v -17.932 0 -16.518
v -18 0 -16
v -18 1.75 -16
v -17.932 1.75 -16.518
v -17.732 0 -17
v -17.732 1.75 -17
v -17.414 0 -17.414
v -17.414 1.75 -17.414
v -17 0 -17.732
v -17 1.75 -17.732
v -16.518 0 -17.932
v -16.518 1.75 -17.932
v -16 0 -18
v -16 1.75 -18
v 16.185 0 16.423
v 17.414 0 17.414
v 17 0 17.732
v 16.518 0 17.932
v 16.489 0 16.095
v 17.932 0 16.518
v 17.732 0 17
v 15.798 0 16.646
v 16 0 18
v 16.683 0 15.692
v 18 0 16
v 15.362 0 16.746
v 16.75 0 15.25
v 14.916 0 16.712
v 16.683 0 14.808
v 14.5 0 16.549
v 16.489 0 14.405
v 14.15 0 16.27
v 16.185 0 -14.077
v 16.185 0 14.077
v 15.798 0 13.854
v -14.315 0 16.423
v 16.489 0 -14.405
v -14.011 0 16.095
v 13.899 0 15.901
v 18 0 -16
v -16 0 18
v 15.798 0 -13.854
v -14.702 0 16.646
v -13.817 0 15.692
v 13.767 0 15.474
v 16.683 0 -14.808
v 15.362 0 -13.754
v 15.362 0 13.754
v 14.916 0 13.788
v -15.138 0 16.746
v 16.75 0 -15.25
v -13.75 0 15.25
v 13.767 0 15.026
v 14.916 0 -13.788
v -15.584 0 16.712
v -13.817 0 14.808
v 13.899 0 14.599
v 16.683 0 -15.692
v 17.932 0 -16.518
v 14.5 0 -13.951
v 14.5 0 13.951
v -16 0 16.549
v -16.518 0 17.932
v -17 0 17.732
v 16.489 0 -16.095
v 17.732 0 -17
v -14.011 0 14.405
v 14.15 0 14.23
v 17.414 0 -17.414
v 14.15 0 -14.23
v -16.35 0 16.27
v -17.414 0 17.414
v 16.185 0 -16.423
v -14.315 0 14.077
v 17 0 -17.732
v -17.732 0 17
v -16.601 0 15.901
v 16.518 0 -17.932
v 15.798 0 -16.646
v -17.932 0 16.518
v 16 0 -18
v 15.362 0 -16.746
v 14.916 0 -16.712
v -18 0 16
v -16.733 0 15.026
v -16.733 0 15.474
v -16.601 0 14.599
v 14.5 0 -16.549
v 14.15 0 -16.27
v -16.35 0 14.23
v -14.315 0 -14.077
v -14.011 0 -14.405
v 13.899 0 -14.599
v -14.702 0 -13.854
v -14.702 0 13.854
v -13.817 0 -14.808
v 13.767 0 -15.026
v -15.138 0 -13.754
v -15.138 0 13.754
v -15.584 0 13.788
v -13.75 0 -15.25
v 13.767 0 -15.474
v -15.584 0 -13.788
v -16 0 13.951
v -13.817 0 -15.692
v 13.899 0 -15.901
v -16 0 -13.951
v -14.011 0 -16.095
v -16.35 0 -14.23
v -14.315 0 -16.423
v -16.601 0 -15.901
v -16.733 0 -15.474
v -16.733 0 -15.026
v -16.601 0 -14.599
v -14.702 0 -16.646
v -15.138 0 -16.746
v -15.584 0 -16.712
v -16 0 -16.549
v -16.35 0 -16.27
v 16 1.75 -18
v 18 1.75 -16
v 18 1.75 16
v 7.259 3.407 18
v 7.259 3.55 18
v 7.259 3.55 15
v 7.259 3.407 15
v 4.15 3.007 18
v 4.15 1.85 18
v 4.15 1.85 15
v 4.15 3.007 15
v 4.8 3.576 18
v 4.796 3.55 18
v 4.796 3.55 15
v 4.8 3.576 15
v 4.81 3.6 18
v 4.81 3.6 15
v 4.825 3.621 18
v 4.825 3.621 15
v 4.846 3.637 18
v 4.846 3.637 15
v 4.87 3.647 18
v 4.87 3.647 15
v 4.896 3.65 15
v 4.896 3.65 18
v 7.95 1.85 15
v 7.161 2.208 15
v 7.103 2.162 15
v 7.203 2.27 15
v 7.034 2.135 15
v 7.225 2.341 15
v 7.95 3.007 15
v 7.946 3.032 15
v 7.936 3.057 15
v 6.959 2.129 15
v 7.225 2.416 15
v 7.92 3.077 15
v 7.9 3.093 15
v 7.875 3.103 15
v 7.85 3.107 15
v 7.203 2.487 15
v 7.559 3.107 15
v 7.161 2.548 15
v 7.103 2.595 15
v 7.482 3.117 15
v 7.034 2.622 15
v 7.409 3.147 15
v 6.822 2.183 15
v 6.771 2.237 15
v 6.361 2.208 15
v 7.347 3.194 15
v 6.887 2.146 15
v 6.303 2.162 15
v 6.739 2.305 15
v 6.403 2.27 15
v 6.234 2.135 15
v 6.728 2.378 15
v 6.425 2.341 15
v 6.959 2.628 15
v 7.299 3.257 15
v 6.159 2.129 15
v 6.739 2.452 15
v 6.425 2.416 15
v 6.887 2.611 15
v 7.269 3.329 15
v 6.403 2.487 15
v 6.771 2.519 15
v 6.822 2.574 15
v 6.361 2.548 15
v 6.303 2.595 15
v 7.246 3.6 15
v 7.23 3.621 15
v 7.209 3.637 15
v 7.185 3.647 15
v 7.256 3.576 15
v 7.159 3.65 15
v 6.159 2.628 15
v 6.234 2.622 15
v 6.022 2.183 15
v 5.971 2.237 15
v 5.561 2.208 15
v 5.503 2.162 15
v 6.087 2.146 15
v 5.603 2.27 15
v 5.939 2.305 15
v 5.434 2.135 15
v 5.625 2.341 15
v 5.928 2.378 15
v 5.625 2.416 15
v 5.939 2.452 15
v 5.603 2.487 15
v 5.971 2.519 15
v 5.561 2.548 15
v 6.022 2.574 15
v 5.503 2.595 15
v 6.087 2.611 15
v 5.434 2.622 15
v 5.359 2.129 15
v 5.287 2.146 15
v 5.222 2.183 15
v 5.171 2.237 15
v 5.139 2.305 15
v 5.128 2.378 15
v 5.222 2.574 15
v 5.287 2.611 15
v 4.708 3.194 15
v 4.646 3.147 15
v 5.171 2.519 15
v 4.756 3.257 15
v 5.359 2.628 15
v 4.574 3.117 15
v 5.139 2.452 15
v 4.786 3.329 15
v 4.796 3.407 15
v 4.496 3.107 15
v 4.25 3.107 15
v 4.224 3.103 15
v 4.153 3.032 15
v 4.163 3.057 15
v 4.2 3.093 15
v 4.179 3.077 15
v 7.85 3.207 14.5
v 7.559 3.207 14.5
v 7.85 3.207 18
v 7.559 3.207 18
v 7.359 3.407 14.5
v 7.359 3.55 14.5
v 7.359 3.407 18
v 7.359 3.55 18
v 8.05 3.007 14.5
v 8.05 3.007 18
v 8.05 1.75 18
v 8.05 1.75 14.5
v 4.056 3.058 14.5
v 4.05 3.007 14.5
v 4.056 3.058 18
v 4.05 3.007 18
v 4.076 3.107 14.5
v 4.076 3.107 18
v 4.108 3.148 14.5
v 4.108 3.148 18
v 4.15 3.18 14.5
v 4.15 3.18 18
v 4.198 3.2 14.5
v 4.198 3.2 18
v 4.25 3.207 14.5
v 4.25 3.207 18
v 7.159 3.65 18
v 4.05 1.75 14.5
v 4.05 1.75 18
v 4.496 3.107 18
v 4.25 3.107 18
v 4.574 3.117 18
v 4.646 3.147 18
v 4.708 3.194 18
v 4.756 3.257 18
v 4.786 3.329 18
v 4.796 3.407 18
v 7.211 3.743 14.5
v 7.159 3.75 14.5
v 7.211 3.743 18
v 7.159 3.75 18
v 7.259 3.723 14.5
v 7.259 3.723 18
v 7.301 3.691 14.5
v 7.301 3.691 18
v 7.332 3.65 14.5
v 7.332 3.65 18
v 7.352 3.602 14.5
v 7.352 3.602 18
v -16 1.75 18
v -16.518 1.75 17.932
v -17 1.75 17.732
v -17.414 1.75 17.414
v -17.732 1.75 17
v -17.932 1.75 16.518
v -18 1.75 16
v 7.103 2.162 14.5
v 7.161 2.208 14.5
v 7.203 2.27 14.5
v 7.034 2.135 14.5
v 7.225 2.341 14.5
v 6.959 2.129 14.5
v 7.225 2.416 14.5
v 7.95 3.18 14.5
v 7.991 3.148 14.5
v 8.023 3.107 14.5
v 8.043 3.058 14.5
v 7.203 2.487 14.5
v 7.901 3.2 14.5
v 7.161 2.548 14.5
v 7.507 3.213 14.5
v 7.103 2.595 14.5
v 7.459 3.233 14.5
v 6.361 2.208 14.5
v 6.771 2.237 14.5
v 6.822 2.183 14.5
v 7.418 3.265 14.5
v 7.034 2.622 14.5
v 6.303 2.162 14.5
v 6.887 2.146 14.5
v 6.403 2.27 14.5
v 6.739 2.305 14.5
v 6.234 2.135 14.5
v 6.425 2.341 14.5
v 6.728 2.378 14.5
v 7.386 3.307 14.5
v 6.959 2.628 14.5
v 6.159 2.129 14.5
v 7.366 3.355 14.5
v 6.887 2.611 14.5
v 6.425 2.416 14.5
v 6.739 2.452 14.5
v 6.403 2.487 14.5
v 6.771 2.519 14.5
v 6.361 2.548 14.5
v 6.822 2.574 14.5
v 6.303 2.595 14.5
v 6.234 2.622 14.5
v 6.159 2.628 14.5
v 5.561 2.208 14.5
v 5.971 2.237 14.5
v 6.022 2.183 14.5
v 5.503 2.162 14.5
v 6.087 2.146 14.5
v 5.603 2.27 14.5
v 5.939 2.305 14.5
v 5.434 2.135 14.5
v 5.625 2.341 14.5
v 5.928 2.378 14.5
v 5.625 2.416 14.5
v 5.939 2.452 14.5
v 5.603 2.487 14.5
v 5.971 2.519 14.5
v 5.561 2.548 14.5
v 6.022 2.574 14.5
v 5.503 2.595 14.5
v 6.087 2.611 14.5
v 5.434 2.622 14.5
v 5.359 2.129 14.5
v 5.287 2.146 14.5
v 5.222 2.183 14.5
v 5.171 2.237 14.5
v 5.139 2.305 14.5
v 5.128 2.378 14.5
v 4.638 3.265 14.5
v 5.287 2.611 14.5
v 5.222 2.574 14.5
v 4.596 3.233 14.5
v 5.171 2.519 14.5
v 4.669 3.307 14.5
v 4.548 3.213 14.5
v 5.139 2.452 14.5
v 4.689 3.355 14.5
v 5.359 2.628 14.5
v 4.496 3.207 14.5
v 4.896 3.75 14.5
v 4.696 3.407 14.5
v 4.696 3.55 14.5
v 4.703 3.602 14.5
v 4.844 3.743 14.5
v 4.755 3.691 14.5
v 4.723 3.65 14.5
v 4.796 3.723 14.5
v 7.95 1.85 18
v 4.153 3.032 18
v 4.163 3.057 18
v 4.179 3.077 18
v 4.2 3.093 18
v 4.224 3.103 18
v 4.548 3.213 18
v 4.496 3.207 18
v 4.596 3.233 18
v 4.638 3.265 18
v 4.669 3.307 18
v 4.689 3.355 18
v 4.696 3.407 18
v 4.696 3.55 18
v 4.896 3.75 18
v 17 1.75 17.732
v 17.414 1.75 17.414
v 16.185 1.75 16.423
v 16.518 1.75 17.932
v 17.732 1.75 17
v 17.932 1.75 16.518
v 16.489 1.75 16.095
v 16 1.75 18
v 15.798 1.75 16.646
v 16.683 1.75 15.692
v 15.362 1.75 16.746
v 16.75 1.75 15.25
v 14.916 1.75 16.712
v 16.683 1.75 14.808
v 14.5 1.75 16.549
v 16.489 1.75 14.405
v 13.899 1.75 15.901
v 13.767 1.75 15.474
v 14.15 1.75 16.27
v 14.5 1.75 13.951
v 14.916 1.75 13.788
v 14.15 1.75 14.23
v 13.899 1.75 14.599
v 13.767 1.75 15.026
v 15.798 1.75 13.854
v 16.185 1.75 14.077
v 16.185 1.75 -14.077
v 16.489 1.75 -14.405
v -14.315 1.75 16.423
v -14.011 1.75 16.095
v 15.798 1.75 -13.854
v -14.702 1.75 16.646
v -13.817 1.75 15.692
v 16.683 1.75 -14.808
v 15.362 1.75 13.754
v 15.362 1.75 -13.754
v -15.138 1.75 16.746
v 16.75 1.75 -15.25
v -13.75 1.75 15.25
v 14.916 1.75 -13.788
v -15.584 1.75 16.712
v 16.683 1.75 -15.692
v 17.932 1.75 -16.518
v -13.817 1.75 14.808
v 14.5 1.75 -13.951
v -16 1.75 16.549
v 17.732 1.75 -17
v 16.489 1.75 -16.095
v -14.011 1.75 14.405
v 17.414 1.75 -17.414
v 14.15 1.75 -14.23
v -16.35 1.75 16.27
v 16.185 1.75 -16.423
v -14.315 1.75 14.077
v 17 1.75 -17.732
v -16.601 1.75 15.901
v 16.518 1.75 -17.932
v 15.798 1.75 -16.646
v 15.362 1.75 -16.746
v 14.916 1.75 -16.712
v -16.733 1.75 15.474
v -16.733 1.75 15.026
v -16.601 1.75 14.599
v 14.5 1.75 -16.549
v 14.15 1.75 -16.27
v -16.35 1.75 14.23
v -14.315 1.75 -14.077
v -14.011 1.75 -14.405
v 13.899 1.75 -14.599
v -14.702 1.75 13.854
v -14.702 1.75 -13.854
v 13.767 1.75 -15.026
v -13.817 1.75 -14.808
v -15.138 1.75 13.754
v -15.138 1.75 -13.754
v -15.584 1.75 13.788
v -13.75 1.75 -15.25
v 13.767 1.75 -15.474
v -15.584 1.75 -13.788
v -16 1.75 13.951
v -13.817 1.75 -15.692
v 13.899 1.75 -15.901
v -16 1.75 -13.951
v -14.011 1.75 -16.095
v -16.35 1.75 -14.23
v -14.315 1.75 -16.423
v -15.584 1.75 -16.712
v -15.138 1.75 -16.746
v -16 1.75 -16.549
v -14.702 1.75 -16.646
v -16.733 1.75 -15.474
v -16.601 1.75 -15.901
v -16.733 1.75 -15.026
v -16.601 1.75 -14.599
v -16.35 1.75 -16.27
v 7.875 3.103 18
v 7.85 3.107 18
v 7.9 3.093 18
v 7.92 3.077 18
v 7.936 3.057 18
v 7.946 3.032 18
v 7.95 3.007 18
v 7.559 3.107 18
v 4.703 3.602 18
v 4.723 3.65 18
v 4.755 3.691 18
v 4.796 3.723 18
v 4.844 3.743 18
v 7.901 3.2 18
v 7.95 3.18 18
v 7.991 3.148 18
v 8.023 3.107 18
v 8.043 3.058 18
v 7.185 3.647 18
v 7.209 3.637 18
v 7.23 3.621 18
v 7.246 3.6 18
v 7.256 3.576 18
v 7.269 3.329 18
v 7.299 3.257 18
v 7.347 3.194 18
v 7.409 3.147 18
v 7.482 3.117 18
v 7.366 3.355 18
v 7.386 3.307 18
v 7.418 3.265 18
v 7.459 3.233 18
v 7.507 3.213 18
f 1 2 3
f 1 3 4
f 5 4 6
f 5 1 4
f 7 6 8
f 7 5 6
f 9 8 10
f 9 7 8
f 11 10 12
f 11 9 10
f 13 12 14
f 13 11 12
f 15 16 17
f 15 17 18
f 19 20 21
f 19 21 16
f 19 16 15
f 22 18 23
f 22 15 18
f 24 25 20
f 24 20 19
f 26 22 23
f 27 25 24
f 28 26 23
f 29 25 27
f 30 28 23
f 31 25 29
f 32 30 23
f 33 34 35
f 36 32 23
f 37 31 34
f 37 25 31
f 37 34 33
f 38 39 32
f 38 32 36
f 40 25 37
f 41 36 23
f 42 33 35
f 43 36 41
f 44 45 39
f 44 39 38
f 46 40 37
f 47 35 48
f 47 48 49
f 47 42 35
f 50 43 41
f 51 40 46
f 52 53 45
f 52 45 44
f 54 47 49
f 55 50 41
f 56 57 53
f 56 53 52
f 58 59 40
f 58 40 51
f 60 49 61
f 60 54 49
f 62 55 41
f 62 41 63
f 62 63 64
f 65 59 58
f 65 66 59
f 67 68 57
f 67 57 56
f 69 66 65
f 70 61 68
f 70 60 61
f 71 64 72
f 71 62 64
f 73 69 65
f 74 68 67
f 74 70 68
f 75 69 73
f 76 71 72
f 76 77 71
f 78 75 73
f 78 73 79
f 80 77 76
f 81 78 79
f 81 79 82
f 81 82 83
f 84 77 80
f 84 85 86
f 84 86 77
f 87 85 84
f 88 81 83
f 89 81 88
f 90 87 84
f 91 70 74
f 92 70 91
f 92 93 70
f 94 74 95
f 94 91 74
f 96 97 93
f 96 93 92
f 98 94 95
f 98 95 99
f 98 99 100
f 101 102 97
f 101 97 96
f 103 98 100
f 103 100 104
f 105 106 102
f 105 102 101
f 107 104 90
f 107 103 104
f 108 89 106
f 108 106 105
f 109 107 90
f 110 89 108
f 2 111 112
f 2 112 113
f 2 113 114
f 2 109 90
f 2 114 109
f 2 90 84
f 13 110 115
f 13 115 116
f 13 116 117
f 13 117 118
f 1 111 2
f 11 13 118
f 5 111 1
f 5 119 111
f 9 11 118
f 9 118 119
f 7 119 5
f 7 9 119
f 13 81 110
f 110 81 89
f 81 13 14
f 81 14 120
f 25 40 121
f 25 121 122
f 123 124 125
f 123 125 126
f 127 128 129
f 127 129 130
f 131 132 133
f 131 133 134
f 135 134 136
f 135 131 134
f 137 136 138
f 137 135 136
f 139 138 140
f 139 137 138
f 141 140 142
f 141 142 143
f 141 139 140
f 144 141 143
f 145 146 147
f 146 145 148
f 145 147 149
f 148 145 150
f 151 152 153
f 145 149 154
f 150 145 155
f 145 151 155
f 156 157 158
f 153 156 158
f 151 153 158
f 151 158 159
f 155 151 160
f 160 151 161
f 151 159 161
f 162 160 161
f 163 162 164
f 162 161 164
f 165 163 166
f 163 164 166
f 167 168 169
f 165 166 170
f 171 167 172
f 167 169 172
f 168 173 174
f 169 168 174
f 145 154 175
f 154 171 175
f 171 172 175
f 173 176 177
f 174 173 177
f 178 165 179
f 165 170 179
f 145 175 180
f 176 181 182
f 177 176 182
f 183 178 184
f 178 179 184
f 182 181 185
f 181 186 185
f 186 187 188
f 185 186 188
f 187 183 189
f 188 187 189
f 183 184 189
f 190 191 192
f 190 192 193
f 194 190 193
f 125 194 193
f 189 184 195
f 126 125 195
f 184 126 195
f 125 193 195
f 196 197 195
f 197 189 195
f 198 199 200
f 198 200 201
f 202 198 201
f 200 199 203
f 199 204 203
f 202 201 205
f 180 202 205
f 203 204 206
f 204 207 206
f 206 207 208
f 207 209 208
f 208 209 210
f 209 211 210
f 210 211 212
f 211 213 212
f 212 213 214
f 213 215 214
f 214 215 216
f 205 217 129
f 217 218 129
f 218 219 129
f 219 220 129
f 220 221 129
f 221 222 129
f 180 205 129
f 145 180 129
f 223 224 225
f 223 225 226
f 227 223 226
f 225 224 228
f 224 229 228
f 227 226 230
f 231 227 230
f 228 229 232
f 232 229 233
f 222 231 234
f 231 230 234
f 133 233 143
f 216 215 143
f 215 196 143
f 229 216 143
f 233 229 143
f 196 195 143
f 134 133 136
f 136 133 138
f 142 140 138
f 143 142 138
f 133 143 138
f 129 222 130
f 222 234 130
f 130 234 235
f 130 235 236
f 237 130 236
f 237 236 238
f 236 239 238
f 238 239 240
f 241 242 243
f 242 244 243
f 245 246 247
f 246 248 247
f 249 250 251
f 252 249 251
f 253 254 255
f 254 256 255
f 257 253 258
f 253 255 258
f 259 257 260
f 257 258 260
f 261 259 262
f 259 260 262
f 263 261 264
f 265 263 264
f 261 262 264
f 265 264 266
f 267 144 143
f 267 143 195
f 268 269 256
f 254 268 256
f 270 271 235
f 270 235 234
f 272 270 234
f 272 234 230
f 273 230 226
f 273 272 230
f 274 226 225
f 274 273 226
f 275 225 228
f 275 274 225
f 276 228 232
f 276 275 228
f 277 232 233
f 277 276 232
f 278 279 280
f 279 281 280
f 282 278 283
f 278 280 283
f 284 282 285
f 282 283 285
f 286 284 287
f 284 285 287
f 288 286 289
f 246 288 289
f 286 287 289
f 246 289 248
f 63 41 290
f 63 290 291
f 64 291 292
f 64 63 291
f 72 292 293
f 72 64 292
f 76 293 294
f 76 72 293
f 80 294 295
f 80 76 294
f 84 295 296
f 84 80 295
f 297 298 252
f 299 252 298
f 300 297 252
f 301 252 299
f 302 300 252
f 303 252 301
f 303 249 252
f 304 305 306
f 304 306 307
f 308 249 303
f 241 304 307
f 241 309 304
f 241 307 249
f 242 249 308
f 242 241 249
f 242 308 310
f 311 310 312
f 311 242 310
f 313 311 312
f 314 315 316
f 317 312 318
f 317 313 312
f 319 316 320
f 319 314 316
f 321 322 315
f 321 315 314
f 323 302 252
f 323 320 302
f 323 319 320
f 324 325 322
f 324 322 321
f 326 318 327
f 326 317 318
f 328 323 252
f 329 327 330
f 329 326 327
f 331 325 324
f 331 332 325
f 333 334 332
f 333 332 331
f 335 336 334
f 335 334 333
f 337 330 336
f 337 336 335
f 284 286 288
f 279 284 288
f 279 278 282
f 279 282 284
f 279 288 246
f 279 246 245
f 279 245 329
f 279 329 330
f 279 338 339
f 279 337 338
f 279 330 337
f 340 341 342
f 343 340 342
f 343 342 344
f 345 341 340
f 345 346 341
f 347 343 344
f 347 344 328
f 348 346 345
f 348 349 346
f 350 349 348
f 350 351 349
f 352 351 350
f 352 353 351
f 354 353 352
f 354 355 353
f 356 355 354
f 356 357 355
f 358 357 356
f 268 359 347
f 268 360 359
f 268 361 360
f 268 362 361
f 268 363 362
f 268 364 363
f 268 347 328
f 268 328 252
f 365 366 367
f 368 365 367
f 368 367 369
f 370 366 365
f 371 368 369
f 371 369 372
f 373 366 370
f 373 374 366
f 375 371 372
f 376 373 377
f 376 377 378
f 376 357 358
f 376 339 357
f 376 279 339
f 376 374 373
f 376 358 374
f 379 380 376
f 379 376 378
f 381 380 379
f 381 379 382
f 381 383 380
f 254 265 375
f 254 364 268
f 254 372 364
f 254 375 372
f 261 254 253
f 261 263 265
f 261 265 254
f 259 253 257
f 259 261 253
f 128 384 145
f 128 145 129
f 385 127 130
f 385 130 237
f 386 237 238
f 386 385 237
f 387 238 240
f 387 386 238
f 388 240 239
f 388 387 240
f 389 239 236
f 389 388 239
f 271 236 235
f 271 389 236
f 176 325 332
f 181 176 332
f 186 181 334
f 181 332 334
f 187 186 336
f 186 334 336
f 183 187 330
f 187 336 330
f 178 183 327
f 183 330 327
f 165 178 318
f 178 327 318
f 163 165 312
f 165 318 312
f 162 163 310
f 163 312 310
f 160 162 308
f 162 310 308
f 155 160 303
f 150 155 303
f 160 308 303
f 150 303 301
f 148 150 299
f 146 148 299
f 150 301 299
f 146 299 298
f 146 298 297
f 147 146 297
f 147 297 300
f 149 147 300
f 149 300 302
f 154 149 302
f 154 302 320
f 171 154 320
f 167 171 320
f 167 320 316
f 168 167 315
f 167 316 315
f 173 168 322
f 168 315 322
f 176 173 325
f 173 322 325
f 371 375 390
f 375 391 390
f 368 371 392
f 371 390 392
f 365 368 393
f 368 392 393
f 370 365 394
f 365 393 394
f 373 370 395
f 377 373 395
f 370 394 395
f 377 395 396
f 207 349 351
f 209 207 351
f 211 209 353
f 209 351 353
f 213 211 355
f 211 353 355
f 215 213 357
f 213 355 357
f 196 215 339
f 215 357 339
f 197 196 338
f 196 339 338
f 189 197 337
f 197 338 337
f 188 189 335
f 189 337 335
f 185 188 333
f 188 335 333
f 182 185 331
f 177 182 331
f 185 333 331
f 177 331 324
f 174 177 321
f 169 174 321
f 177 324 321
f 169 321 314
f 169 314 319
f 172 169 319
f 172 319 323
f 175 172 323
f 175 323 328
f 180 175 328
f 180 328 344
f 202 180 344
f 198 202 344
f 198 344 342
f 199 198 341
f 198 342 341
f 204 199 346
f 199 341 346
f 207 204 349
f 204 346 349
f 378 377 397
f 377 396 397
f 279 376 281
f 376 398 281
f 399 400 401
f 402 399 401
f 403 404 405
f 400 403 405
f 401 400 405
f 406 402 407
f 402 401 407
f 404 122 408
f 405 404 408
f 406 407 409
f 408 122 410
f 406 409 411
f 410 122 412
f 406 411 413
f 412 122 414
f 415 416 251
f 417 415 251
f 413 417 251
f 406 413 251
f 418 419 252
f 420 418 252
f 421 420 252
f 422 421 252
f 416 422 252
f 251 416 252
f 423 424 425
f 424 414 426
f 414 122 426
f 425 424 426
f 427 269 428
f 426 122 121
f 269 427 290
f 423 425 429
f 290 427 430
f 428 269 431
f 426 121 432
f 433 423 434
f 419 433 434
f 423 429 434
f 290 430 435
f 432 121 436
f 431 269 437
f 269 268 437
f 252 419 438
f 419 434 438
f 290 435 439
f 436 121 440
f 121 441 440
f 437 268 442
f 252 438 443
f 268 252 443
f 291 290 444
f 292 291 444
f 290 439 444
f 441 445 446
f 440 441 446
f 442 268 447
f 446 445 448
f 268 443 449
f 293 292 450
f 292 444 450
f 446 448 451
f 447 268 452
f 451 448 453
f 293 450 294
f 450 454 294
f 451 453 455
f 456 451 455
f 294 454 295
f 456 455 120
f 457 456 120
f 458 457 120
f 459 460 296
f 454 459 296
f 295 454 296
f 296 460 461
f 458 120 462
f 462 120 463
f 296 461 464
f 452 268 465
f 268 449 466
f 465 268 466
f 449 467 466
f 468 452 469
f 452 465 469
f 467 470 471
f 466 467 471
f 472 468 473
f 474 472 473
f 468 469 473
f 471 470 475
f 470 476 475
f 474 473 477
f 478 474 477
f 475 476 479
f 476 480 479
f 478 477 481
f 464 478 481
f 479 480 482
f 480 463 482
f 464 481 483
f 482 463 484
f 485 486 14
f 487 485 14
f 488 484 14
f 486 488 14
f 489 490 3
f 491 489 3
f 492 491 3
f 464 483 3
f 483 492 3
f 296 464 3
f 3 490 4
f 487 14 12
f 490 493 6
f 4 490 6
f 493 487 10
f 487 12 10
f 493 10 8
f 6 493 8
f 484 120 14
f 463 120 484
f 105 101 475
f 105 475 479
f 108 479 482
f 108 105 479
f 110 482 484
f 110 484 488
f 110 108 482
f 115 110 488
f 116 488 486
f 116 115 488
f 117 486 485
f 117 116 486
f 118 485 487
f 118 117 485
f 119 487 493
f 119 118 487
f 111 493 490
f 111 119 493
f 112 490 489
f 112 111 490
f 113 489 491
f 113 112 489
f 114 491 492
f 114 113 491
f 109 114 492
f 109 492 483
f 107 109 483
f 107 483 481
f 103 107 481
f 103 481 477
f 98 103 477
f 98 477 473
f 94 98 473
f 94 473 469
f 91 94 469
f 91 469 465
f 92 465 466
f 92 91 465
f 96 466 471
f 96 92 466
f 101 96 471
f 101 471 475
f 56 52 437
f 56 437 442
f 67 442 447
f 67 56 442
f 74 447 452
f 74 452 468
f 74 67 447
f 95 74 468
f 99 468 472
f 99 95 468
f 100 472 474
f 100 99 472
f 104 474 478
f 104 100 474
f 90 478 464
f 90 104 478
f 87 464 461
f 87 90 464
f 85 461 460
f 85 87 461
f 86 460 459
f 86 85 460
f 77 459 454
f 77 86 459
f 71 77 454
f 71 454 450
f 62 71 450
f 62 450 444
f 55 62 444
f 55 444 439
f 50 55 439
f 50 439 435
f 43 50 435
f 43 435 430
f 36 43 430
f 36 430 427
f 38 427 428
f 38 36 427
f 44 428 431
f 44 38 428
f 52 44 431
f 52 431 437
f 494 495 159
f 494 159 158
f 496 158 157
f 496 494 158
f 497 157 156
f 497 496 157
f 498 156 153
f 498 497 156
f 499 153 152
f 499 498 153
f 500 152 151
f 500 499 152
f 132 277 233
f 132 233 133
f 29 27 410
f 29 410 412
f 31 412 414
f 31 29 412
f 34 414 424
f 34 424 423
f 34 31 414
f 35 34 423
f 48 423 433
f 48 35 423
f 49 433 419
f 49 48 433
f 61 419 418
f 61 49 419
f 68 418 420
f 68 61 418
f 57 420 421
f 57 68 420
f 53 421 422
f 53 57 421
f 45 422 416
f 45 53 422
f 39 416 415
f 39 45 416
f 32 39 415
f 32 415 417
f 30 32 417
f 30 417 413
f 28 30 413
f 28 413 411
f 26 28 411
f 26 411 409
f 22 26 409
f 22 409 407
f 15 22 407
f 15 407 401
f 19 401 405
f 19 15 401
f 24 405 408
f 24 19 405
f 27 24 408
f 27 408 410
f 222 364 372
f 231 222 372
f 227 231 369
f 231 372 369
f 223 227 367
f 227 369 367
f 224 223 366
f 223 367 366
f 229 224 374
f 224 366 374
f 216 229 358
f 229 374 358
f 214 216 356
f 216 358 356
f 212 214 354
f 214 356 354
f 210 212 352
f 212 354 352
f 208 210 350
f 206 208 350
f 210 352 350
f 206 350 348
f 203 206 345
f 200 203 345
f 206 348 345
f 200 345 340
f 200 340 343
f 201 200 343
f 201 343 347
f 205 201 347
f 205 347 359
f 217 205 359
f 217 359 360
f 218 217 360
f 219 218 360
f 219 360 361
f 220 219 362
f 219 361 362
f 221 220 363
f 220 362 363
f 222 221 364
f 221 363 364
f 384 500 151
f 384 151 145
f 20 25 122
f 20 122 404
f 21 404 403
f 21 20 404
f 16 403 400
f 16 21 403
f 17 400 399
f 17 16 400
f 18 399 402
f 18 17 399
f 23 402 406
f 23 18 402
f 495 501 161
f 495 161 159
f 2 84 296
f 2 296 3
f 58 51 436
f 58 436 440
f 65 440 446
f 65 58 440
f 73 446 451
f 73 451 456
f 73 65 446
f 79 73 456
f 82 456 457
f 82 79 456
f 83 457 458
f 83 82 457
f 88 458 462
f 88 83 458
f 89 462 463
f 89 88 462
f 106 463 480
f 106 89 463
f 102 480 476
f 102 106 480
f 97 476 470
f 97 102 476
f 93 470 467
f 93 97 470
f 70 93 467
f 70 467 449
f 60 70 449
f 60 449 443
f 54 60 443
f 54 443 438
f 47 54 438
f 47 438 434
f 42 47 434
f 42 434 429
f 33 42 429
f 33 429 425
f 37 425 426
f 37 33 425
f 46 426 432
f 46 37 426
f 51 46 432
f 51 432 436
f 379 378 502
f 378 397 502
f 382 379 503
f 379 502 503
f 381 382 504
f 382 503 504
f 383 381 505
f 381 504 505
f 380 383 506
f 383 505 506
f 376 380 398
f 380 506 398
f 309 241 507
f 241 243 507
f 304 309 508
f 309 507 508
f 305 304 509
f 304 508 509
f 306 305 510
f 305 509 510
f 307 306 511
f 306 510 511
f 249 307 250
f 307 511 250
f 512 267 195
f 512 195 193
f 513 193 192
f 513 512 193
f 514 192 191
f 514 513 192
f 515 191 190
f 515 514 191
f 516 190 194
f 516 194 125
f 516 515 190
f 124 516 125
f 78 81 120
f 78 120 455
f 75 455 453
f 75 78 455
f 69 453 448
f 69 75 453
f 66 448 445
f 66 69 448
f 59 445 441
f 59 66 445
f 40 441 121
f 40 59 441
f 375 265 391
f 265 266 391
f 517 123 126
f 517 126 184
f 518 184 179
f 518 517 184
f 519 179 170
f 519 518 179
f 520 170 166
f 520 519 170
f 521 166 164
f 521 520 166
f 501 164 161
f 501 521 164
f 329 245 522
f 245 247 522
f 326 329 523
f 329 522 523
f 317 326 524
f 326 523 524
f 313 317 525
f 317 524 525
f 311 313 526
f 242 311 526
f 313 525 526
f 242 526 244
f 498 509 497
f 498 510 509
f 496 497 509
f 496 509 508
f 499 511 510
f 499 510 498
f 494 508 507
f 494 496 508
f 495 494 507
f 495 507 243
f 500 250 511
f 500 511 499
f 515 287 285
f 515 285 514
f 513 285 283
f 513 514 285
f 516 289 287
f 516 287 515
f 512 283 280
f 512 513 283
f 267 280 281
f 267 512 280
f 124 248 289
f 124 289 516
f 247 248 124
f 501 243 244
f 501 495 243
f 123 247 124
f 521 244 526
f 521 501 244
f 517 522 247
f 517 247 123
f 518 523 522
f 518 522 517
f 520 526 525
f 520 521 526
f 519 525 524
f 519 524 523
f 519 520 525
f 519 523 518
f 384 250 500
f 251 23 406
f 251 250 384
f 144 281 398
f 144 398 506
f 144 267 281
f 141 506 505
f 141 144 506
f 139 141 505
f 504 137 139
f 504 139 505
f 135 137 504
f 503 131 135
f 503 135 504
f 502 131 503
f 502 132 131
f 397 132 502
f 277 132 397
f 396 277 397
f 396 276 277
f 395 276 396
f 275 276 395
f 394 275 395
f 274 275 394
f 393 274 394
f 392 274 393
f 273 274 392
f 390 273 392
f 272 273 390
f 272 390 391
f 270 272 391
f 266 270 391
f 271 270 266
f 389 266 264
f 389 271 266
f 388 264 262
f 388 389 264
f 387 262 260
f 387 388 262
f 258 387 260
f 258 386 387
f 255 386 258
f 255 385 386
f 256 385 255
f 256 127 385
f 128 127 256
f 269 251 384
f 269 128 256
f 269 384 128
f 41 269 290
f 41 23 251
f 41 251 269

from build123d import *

# Parameters (mm, degrees)
SKETCH3_R           = 1.5
BOSS_EXTRUDE1_DEPTH = 1.75
BOSS_EXTRUDE2_DEPTH = 3
BOSS_EXTRUDE3_DEPTH = 0.5
SKETCH7_R           = 0.25
CUT_EXTRUDE1_DEPTH  = 0.5


with BuildPart() as part:
    # Sketch3 → Boss-Extrude1 (new body)
    with BuildSketch(Plane(origin=(0, 0, 0), x_dir=(1, 0, 0), z_dir=(0, 1, 0))):
        with BuildLine():
            Line((-16, 18), (16, 18))
            ThreePointArc((16, 18), (17.414213562, 17.414213562), (18, 16))
            Line((18, 16), (18, -16))
            ThreePointArc((18, -16), (17.414213562, -17.414213562), (16, -18))
            Line((16, -18), (-16, -18))
            ThreePointArc((-16, -18), (-17.414213562, -17.414213562), (-18, -16))
            Line((-18, -16), (-18, 16))
            ThreePointArc((-18, 16), (-17.414213562, 17.414213562), (-16, 18))
        make_face()
        with Locations((-15.25, 15.25)):
            Circle(SKETCH3_R, mode=Mode.SUBTRACT)
        with Locations((15.25, 15.25)):
            Circle(SKETCH3_R, mode=Mode.SUBTRACT)
        with Locations((15.25, -15.25)):
            Circle(SKETCH3_R, mode=Mode.SUBTRACT)
        with Locations((-15.25, -15.25)):
            Circle(SKETCH3_R, mode=Mode.SUBTRACT)
    extrude(amount=BOSS_EXTRUDE1_DEPTH)

    # Sketch5 → Boss-Extrude2 (add)
    with BuildSketch(Plane.XY.offset(18)):
        with BuildLine():
            Line((4.049502187, 1.75), (8.049502187, 1.75))
            Line((8.049502187, 1.75), (8.049502187, 3.006518046))
            ThreePointArc((8.049502187, 3.006518046), (7.990923543, 3.147939402), (7.849502187, 3.206518046))
            Line((7.849502187, 3.206518046), (7.559209809, 3.206518046))
            ThreePointArc((7.559209809, 3.206518046), (7.417788453, 3.26509669), (7.359209809, 3.406518046))
            Line((7.359209809, 3.406518046), (7.359209809, 3.55))
            ThreePointArc((7.359209809, 3.55), (7.300631165, 3.691421356), (7.159209809, 3.75))
            Line((7.159209809, 3.75), (4.896173717, 3.75))
            ThreePointArc((4.896173717, 3.75), (4.754752361, 3.691421356), (4.696173717, 3.55))
            Line((4.696173717, 3.55), (4.696173717, 3.406518046))
            ThreePointArc((4.696173717, 3.406518046), (4.637595073, 3.26509669), (4.496173717, 3.206518046))
            Line((4.496173717, 3.206518046), (4.249502187, 3.206518046))
            ThreePointArc((4.249502187, 3.206518046), (4.10808083, 3.147939402), (4.049502187, 3.006518046))
            Line((4.049502187, 3.006518046), (4.049502187, 1.75))
        make_face()
        with BuildLine():
            Line((4.896173717, 3.65), (7.159209809, 3.65))
            ThreePointArc((7.159209809, 3.65), (7.229920487, 3.620710678), (7.259209809, 3.55))
            Line((7.259209809, 3.55), (7.259209809, 3.406518046))
            ThreePointArc((7.259209809, 3.406518046), (7.347077775, 3.194386012), (7.559209809, 3.106518046))
            Line((7.559209809, 3.106518046), (7.849502187, 3.106518046))
            ThreePointArc((7.849502187, 3.106518046), (7.920212865, 3.077228724), (7.949502187, 3.006518046))
            Line((7.949502187, 3.006518046), (7.949502187, 1.85))
            Line((7.949502187, 1.85), (4.149502187, 1.85))
            Line((4.149502187, 1.85), (4.149502187, 3.006518046))
            ThreePointArc((4.149502187, 3.006518046), (4.178791509, 3.077228724), (4.249502187, 3.106518046))
            Line((4.249502187, 3.106518046), (4.496173717, 3.106518046))
            ThreePointArc((4.496173717, 3.106518046), (4.708305751, 3.194386012), (4.796173717, 3.406518046))
            Line((4.796173717, 3.406518046), (4.796173717, 3.55))
            ThreePointArc((4.796173717, 3.55), (4.825463039, 3.620710678), (4.896173717, 3.65))
        make_face(mode=Mode.SUBTRACT)
    extrude(amount=-BOSS_EXTRUDE2_DEPTH)

    # Sketch6 → Boss-Extrude3 (add)
    with BuildSketch(Plane(origin=(0, 0, 15), x_dir=(-1, 0, 0), z_dir=(0, 0, -1))):
        with BuildLine():
            Line((-4.049502187, 1.75), (-4.049502187, 3.006518046))
            ThreePointArc((-4.049502187, 3.006518046), (-4.10808083, 3.147939402), (-4.249502187, 3.206518046))
            Line((-4.249502187, 3.206518046), (-4.496173717, 3.206518046))
            ThreePointArc((-4.496173717, 3.206518046), (-4.637595073, 3.26509669), (-4.696173717, 3.406518046))
            Line((-4.696173717, 3.406518046), (-4.696173717, 3.55))
            ThreePointArc((-4.696173717, 3.55), (-4.754752361, 3.691421356), (-4.896173717, 3.75))
            Line((-4.896173717, 3.75), (-7.159209809, 3.75))
            ThreePointArc((-7.159209809, 3.75), (-7.300631165, 3.691421356), (-7.359209809, 3.55))
            Line((-7.359209809, 3.55), (-7.359209809, 3.406518046))
            ThreePointArc((-7.359209809, 3.406518046), (-7.417788453, 3.26509669), (-7.559209809, 3.206518046))
            Line((-7.559209809, 3.206518046), (-7.849502187, 3.206518046))
            ThreePointArc((-7.849502187, 3.206518046), (-7.990923543, 3.147939402), (-8.049502187, 3.006518046))
            Line((-8.049502187, 3.006518046), (-8.049502187, 1.75))
            Line((-8.049502187, 1.75), (-4.049502187, 1.75))
        make_face()
    extrude(amount=BOSS_EXTRUDE3_DEPTH)

    # Sketch7 → Cut-Extrude1 (cut)
    with BuildSketch(Plane(origin=(0, 0, 14.5), x_dir=(-1, 0, 0), z_dir=(0, 0, -1))):
        with Locations((-6.97797188, 2.378259023)):
            Circle(SKETCH7_R)
        with Locations((-6.17797188, 2.378259023)):
            Circle(SKETCH7_R)
        with Locations((-5.37797188, 2.378259023)):
            Circle(SKETCH7_R)
    extrude(amount=-CUT_EXTRUDE1_DEPTH, mode=Mode.SUBTRACT)


solid = part.part
